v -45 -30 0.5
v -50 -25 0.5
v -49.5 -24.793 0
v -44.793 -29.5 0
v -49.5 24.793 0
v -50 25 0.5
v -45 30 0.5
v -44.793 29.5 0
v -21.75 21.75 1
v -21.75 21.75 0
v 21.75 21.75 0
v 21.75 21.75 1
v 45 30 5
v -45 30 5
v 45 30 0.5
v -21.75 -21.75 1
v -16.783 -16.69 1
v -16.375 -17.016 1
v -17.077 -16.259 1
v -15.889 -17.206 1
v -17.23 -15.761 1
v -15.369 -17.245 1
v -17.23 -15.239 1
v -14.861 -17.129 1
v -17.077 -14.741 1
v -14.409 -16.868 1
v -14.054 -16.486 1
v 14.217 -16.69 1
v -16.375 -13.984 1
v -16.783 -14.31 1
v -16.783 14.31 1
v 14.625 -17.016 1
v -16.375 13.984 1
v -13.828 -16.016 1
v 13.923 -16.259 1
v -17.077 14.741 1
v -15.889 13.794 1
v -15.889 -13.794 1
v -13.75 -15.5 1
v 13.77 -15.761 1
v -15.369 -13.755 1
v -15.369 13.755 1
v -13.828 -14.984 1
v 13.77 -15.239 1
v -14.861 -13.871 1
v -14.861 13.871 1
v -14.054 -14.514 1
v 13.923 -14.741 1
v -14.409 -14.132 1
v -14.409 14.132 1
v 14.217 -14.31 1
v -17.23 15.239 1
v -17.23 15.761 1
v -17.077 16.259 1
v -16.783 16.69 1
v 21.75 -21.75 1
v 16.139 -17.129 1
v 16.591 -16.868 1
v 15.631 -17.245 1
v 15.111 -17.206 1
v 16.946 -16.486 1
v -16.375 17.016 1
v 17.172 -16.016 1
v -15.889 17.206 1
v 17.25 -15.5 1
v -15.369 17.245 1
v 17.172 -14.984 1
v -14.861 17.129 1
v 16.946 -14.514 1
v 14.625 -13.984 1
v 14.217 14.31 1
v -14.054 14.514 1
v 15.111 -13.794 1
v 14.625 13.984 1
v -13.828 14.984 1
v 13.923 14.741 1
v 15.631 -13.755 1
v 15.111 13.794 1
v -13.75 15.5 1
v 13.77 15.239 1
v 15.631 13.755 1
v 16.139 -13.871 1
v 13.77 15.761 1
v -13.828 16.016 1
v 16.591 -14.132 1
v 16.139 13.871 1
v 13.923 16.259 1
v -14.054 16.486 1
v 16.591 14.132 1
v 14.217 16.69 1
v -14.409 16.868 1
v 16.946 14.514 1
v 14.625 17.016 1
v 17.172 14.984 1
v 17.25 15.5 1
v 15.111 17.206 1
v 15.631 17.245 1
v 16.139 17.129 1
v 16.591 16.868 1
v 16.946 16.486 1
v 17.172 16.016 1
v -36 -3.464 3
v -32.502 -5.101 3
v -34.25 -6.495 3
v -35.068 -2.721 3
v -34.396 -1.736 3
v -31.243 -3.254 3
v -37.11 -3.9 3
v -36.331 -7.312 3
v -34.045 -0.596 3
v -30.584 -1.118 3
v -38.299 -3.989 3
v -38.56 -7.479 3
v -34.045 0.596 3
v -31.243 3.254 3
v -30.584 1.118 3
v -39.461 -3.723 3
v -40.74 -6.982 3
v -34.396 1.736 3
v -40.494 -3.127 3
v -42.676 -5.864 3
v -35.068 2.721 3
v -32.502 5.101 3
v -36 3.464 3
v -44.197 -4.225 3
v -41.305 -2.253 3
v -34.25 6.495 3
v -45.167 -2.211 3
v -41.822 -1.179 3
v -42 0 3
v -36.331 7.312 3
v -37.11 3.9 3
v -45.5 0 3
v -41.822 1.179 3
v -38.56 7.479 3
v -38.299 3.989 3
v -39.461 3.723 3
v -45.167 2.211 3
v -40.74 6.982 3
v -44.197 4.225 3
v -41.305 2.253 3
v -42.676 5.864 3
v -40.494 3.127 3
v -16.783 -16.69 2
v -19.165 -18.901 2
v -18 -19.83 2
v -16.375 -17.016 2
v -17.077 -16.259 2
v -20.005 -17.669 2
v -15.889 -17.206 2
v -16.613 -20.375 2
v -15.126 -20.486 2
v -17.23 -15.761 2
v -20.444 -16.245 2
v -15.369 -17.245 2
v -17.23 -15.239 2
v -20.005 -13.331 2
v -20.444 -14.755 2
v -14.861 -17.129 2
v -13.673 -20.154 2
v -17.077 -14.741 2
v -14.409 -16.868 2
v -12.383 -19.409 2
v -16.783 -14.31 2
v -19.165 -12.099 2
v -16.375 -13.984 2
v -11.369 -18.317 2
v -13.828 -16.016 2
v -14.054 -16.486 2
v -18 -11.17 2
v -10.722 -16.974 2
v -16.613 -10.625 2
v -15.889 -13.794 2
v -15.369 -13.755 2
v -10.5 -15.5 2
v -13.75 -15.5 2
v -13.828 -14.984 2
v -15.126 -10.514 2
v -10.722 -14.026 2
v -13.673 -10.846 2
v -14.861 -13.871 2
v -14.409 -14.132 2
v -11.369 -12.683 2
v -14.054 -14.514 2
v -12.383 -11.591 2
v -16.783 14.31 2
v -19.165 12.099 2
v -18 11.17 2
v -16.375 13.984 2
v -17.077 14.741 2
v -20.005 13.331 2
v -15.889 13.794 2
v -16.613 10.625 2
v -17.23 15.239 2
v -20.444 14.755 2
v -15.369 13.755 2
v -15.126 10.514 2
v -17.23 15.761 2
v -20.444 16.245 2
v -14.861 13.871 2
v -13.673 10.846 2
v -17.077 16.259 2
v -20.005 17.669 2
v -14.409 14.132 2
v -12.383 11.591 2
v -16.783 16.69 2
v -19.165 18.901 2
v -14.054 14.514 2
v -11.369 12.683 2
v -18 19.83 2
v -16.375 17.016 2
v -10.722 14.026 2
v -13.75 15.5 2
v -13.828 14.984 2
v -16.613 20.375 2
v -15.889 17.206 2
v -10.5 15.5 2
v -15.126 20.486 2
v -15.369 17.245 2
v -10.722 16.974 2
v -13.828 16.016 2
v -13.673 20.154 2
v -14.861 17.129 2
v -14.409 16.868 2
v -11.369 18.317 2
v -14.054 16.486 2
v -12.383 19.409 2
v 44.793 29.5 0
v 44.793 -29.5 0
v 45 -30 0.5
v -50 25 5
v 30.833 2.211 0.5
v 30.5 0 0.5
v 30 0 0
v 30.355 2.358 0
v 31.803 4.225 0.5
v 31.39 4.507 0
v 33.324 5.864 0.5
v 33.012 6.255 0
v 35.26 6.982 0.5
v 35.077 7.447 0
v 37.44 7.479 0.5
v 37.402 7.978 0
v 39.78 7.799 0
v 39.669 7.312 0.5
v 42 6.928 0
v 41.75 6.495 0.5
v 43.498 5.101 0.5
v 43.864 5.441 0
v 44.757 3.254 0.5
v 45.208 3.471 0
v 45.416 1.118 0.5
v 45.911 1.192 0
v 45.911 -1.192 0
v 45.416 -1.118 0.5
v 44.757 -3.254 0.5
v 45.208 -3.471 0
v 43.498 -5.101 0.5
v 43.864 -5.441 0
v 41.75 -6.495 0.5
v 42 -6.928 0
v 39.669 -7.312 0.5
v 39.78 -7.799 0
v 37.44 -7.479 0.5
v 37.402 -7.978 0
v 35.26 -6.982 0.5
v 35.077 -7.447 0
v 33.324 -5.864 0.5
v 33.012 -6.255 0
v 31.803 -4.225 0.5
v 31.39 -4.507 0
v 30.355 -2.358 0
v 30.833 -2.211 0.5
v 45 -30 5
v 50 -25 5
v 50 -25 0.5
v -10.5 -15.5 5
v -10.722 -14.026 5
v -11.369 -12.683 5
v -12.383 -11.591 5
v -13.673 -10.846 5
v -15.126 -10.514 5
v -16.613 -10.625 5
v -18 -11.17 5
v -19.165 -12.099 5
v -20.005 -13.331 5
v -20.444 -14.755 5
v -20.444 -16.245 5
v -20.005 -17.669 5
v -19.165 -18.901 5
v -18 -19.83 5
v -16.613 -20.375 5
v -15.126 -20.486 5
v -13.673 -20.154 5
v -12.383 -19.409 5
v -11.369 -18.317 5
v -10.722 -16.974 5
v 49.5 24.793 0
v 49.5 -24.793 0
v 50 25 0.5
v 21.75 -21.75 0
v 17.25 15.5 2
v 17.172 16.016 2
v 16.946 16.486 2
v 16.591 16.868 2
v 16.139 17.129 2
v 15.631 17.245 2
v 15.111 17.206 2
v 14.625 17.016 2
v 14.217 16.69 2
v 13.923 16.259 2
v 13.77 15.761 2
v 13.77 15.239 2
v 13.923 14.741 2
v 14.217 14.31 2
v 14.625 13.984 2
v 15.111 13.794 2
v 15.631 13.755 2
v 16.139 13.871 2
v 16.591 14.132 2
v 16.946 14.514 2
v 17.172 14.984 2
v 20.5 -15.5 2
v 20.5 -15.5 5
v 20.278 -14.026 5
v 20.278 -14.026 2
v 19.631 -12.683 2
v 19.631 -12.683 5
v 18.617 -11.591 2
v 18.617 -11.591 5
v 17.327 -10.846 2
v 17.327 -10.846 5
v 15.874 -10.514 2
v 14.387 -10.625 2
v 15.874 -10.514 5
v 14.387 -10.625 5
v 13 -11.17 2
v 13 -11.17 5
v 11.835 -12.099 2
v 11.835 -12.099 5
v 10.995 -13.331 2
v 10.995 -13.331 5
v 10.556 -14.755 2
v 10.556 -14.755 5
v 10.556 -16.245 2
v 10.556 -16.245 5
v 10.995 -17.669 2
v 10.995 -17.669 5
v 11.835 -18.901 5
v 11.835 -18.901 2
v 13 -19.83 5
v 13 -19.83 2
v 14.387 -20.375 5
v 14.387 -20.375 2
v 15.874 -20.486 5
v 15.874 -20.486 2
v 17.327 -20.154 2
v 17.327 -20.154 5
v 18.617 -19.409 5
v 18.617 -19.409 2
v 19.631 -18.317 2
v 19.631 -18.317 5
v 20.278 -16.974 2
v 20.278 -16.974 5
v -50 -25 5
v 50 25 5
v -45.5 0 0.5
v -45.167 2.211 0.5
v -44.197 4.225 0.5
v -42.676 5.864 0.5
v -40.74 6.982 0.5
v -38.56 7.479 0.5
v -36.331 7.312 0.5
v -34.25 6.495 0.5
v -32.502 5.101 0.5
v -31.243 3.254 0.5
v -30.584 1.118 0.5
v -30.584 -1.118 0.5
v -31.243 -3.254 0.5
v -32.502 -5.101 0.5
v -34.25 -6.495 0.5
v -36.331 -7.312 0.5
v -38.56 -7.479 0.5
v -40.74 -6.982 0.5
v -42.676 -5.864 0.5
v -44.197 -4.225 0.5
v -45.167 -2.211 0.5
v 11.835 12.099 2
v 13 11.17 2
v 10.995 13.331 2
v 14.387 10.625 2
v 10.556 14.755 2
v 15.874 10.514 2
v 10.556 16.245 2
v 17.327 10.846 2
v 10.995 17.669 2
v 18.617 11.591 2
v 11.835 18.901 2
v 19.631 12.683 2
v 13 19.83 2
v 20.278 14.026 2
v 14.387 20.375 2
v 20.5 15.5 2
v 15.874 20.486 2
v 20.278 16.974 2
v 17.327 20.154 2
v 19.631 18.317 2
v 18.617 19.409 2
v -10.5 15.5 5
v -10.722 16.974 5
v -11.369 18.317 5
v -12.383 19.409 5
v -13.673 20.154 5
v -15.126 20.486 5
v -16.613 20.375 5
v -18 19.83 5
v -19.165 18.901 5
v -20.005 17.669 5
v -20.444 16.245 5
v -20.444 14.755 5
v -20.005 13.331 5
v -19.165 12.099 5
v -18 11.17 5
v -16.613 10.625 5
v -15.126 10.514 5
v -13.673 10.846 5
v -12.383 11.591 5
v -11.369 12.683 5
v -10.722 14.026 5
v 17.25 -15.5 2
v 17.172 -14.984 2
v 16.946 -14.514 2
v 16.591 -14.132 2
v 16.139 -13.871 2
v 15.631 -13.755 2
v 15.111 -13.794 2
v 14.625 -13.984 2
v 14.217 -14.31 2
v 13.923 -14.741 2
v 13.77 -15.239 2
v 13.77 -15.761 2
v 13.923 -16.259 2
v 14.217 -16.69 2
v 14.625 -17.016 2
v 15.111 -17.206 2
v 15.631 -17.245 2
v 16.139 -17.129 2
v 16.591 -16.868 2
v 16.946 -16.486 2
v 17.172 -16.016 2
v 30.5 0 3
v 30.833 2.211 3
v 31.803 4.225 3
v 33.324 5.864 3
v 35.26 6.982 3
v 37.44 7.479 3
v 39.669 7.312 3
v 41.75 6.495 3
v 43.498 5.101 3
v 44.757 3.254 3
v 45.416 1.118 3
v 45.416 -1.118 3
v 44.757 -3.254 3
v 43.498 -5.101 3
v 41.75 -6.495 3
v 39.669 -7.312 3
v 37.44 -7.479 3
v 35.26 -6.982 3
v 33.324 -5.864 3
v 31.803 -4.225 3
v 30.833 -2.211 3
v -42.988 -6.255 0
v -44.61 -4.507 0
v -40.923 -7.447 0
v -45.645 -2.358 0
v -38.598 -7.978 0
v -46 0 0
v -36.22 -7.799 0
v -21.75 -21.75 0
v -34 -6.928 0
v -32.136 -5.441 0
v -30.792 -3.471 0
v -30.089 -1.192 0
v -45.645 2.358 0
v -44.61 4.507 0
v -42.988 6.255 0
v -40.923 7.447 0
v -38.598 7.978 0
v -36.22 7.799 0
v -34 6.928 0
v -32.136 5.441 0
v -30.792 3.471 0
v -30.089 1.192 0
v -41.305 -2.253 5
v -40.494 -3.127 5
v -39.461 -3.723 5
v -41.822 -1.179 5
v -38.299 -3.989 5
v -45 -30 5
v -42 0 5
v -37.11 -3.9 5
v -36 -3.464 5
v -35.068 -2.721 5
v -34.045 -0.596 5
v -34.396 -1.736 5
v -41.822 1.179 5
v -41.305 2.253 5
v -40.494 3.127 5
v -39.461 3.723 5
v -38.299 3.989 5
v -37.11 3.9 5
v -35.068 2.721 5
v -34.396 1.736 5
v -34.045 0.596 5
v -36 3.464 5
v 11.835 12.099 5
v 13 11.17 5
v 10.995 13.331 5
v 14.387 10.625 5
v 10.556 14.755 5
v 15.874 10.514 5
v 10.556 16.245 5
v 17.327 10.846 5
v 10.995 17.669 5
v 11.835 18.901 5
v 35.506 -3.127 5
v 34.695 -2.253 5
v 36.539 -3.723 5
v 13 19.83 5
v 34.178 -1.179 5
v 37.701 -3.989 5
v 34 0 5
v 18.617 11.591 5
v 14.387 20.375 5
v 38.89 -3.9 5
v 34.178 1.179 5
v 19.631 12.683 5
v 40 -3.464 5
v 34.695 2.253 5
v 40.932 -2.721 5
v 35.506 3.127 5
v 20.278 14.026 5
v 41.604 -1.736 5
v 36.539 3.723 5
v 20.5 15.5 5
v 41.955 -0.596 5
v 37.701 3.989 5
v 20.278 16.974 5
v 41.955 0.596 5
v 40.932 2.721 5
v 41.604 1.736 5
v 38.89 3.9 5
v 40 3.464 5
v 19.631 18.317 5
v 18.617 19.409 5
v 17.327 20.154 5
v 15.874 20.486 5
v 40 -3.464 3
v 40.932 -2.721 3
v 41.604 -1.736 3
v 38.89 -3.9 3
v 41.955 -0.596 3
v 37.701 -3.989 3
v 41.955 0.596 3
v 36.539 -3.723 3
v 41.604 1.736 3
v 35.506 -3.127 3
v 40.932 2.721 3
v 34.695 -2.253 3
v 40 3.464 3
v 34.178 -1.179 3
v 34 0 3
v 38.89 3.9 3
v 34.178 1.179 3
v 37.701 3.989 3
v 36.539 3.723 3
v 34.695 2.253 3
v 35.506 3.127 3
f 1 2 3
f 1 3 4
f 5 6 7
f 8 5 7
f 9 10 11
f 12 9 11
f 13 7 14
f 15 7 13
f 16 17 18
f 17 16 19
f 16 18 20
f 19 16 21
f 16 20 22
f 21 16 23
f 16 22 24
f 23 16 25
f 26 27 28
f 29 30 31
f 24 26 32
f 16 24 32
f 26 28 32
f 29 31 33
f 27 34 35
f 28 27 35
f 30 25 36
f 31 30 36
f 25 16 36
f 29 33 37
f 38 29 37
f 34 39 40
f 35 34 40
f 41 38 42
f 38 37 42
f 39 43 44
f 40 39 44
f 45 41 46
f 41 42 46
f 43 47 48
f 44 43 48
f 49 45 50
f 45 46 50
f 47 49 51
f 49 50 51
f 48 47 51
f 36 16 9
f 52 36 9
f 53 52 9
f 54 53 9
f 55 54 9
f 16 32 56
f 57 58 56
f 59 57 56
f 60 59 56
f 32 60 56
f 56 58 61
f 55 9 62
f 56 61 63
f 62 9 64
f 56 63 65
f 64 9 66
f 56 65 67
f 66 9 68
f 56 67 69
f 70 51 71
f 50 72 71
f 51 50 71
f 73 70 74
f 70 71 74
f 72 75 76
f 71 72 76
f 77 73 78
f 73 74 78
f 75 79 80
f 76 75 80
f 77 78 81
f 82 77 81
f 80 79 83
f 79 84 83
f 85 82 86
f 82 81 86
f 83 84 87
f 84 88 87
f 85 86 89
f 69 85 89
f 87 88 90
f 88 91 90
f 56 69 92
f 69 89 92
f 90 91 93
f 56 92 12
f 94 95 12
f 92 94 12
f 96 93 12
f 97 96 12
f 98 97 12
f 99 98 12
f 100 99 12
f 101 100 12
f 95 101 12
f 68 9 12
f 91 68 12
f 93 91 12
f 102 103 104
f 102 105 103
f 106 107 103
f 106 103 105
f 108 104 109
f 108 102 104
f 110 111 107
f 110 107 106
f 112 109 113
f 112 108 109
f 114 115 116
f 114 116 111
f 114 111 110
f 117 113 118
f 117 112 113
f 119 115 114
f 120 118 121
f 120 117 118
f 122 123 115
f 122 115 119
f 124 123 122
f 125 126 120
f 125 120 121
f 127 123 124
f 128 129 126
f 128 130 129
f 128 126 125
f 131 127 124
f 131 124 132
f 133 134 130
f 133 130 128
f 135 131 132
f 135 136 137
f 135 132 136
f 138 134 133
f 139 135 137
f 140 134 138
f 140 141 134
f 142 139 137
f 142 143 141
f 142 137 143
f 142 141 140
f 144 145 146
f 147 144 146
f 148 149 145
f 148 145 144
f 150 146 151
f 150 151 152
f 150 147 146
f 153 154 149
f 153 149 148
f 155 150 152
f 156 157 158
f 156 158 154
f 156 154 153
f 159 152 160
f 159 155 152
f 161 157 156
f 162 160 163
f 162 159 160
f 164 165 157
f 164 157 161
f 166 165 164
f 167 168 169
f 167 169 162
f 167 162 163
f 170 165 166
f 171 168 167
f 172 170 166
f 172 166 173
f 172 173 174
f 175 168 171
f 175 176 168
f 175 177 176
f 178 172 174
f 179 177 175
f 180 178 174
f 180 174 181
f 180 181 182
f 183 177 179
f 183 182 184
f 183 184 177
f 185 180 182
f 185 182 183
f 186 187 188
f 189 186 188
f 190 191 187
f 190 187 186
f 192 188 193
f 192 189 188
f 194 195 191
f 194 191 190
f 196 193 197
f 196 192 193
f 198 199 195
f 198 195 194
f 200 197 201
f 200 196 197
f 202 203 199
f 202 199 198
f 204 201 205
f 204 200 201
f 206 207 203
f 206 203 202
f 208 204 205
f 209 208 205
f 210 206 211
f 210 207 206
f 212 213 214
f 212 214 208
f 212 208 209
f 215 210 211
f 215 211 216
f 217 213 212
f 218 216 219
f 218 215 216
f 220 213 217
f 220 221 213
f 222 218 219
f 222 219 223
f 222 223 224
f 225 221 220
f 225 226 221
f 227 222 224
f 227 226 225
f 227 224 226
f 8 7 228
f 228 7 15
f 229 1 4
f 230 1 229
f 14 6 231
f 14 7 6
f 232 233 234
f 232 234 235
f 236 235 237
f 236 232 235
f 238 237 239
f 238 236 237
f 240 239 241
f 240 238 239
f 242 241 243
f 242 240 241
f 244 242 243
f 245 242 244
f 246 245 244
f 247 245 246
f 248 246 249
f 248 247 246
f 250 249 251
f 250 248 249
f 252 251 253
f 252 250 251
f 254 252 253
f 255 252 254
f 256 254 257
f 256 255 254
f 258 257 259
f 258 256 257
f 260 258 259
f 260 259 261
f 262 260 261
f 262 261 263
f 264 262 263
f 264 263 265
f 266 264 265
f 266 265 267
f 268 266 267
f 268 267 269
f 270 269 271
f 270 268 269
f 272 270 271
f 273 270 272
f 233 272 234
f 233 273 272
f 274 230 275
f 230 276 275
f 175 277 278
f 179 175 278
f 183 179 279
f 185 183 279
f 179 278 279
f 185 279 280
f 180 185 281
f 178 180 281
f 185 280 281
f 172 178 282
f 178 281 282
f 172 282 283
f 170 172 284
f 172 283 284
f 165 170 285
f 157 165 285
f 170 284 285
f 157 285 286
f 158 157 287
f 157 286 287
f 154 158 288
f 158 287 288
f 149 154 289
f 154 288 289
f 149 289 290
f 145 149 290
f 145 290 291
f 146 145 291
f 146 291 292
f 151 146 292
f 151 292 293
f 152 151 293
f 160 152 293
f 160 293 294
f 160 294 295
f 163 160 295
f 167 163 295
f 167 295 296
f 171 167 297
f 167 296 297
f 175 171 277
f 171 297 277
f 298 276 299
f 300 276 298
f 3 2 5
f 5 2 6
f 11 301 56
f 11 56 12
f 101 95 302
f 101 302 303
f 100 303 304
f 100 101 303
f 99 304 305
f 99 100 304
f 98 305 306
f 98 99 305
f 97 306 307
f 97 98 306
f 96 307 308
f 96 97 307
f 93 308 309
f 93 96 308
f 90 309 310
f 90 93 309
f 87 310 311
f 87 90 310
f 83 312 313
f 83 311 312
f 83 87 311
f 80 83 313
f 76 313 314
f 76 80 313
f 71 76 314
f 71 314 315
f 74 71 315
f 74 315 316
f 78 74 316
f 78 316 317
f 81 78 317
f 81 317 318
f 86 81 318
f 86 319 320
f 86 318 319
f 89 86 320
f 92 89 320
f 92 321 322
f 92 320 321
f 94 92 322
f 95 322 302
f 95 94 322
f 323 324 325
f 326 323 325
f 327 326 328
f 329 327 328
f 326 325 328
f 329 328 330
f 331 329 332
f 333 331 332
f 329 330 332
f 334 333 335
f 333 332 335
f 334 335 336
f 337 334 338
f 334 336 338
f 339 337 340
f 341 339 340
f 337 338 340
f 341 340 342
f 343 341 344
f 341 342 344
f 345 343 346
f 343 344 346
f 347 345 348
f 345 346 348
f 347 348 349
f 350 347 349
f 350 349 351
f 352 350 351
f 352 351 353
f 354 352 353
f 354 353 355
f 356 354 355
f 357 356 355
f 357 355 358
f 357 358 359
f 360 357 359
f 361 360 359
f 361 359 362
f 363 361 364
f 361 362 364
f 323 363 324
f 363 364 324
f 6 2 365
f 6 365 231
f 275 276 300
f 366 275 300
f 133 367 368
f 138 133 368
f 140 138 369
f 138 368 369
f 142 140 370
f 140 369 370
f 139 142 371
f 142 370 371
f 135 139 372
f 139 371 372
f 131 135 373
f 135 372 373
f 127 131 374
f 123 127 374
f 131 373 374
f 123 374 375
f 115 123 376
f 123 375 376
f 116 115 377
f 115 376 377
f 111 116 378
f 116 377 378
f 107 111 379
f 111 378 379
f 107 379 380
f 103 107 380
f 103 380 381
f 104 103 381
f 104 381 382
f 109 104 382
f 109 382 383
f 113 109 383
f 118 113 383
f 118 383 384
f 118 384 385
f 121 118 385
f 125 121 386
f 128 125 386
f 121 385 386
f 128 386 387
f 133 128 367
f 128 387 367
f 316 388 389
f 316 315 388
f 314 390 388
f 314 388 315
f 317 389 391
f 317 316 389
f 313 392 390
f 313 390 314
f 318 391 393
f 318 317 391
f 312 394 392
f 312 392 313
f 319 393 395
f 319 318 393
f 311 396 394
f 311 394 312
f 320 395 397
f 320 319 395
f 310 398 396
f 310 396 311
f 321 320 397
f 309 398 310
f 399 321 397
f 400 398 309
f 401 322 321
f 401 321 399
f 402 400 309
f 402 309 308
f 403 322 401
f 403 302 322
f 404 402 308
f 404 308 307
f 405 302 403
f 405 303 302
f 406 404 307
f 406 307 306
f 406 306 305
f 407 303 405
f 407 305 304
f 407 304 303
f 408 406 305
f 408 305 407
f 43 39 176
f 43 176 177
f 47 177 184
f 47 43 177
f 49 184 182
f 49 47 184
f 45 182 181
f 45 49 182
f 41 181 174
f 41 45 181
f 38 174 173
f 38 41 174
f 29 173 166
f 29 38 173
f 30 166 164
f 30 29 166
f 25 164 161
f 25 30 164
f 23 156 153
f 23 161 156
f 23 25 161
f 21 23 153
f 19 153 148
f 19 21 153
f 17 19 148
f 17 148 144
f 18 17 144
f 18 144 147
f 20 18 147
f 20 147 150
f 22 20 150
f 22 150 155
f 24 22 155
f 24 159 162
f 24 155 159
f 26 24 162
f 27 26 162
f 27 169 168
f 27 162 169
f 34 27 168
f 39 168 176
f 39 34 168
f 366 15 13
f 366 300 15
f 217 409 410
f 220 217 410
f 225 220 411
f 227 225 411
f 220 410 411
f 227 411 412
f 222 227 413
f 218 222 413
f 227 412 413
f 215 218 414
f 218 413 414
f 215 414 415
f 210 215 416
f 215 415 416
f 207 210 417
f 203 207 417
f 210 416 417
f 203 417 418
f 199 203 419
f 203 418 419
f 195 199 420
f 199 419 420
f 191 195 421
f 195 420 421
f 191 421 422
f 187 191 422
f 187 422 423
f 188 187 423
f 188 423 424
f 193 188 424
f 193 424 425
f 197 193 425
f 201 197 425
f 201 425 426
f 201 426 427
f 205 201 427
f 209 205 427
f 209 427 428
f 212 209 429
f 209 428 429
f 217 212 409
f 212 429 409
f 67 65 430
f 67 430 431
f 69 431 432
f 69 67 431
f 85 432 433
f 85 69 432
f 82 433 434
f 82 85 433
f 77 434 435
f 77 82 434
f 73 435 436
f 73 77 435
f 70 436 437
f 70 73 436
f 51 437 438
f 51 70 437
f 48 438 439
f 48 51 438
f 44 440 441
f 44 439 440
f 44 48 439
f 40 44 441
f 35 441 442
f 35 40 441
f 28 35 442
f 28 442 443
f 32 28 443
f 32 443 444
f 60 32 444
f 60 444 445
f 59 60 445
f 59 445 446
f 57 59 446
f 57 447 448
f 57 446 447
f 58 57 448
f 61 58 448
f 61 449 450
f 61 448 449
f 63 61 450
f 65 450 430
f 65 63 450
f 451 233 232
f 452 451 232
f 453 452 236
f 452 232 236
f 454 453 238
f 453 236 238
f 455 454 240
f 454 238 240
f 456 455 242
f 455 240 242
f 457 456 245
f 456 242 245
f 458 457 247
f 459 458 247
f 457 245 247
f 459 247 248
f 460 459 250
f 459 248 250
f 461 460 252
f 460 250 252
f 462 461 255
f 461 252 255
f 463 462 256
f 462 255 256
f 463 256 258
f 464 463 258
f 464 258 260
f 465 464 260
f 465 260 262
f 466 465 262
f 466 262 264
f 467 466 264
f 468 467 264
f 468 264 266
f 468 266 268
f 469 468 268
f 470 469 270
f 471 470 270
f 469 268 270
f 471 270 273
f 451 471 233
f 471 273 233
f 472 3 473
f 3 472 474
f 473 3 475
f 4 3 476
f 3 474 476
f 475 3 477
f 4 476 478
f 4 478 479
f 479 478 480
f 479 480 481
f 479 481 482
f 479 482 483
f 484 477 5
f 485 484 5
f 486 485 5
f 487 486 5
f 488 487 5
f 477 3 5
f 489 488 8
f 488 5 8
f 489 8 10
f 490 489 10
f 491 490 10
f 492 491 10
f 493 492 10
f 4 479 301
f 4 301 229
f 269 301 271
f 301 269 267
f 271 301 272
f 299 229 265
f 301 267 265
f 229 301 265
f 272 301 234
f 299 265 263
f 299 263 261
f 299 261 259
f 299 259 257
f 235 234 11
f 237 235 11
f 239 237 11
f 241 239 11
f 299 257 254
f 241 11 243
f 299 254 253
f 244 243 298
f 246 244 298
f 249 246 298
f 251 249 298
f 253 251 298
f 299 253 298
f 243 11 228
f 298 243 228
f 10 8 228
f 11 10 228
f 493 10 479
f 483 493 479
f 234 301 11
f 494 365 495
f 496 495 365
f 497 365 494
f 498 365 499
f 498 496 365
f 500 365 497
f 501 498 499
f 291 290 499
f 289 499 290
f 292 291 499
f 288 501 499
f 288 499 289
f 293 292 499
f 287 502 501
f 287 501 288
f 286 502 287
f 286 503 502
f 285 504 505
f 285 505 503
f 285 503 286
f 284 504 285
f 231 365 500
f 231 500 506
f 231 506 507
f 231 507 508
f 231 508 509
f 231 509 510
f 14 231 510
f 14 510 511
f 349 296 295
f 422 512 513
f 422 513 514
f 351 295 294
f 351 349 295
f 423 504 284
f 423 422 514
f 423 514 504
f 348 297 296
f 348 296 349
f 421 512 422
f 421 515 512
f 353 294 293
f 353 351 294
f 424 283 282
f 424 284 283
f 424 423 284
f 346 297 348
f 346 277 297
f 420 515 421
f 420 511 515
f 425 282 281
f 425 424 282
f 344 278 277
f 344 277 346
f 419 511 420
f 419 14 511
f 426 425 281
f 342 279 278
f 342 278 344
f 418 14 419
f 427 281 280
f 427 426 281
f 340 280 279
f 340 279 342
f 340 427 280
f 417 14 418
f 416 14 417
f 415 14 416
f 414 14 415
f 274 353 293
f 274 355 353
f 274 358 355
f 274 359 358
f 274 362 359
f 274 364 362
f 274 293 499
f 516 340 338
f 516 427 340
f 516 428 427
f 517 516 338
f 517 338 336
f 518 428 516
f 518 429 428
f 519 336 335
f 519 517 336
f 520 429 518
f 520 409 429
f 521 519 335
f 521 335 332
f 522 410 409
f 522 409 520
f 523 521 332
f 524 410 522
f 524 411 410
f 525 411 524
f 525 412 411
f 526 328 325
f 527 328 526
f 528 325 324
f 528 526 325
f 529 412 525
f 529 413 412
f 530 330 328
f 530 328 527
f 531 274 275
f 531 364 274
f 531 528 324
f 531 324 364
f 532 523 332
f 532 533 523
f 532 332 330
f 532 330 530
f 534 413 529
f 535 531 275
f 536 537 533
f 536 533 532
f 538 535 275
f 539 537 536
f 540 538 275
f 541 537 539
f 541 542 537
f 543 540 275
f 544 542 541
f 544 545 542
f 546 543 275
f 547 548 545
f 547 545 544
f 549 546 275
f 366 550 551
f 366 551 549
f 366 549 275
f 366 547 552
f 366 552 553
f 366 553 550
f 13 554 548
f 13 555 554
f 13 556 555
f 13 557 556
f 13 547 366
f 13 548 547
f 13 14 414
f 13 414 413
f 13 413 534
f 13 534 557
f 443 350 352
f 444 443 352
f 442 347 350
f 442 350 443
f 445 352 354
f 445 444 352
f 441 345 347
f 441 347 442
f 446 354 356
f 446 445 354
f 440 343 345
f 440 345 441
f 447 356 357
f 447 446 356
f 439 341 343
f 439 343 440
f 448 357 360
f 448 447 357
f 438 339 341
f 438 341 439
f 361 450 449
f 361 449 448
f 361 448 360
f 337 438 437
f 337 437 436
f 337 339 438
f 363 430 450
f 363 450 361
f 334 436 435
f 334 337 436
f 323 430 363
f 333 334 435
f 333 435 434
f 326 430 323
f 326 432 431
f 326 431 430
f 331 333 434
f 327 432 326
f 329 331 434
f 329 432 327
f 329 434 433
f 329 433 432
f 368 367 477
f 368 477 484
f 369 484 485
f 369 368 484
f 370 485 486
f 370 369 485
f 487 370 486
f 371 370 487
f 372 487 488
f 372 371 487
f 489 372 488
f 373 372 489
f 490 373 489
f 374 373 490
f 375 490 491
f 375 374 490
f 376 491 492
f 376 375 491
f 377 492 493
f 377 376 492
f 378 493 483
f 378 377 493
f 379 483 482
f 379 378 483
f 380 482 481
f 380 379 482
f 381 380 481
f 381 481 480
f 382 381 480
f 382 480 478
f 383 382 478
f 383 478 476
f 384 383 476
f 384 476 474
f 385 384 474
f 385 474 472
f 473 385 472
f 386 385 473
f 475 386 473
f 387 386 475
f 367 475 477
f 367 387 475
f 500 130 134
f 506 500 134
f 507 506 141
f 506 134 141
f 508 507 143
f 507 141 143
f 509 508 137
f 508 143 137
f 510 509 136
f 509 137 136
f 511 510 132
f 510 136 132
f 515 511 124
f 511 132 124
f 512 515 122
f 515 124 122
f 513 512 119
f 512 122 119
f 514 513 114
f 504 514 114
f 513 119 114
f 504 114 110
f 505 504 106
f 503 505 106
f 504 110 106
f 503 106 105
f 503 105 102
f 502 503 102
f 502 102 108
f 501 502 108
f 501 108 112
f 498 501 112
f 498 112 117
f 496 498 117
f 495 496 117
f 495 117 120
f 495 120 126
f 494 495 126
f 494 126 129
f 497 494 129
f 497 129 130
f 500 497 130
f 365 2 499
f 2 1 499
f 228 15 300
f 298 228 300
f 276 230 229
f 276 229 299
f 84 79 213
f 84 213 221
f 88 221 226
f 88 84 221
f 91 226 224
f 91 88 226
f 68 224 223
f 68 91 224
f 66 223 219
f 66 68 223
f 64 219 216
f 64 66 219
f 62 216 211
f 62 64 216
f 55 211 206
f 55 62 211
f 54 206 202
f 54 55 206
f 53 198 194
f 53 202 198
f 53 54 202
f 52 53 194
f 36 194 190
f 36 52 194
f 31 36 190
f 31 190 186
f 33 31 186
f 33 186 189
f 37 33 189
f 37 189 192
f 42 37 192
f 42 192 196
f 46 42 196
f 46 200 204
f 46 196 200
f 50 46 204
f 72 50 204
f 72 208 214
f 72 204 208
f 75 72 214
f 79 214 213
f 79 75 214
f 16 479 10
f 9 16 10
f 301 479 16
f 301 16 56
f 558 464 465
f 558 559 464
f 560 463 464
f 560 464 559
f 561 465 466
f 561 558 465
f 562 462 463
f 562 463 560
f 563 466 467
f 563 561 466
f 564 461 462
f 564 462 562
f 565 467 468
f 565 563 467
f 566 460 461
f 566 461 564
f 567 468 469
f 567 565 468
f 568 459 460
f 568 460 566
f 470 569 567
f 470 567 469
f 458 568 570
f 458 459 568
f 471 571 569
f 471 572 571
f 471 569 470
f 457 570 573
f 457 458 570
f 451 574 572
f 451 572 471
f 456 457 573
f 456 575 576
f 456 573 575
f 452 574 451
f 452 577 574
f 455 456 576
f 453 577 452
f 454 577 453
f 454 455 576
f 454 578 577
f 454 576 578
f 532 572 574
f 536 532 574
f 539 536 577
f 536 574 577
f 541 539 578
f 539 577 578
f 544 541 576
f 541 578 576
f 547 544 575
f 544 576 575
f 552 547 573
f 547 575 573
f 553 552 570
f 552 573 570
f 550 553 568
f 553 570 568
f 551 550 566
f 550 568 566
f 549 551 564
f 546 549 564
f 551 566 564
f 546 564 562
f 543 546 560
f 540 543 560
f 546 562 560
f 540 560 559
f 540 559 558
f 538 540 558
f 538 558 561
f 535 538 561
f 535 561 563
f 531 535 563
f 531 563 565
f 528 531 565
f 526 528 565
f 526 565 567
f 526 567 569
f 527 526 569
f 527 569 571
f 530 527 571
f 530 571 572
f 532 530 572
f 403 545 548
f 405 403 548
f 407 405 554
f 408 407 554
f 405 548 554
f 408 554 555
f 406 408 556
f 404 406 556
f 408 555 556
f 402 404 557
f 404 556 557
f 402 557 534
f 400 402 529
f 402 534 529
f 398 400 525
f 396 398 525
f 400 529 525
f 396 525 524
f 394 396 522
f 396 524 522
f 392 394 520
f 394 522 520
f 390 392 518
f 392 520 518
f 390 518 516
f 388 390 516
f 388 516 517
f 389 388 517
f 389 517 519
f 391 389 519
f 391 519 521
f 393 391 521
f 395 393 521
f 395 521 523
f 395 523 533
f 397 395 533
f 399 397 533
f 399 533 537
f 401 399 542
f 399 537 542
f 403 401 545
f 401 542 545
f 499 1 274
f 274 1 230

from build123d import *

# Parameters (mm, degrees)
SKETCH1_W               = 100
SKETCH1_H               = 60
BOSS_EXTRUDE1_DEPTH     = 5
SKETCH3_W               = 43.5
SKETCH3_H               = 43.5
CUT_EXTRUDE1_DEPTH      = 1
SKETCH4_R               = 1.75
CUT_EXTRUDE3_DEPTH      = 92
CUT_EXTRUDE3_DEPTH_BACK = 1
SKETCH5_R               = 5
CUT_EXTRUDE4_DEPTH      = 3
SKETCH6_R               = 4
CUT_EXTRUDE5_DEPTH      = 1
CUT_EXTRUDE5_DEPTH_BACK = 6
SKETCH7_R               = 7.5
CUT_EXTRUDE6_DEPTH      = 3
CHAMFER1_SIZE           = 0.5
CHAMFER2_SIZE           = 5
CHAMFER3_SIZE           = 0.5


with BuildPart() as part:
    # Sketch1 → Boss-Extrude1 (new body)
    with BuildSketch(Plane.XY):
        Rectangle(SKETCH1_W, SKETCH1_H)
    extrude(amount=BOSS_EXTRUDE1_DEPTH)

    # Sketch3 → Cut-Extrude1 (cut)
    with BuildSketch(Plane.XY):
        Rectangle(SKETCH3_W, SKETCH3_H)
    extrude(amount=CUT_EXTRUDE1_DEPTH, mode=Mode.SUBTRACT)

    # Sketch4 → Cut-Extrude3 (cut, two sides)
    with BuildSketch(Plane.XY.offset(-48)) as cut_extrude3_sk:
        with Locations((-15.5, 15.5)):
            Circle(SKETCH4_R)
        with Locations((15.5, 15.5)):
            Circle(SKETCH4_R)
        with Locations((15.499999999, -15.5)):
            Circle(SKETCH4_R)
        with Locations((-15.5, -15.5)):
            Circle(SKETCH4_R)
    extrude(amount=CUT_EXTRUDE3_DEPTH, mode=Mode.SUBTRACT)
    extrude(cut_extrude3_sk.sketch, amount=-CUT_EXTRUDE3_DEPTH_BACK, mode=Mode.SUBTRACT)

    # Sketch5 → Cut-Extrude4 (cut)
    with BuildSketch(Plane.XY.offset(5)):
        with Locations((-15.5, 15.5)):
            Circle(SKETCH5_R)
        with Locations((15.5, 15.5)):
            Circle(SKETCH5_R)
        with Locations((15.499999999, -15.5)):
            Circle(SKETCH5_R)
        with Locations((-15.5, -15.5)):
            Circle(SKETCH5_R)
    extrude(amount=-CUT_EXTRUDE4_DEPTH, mode=Mode.SUBTRACT)

    # Sketch6 → Cut-Extrude5 (cut, two sides)
    with BuildSketch(Plane(origin=(0, 0, 0), x_dir=(-1, 0, 0), z_dir=(0, 0, -1))) as cut_extrude5_sk:
        with Locations((-38, 0)):
            Circle(SKETCH6_R)
        with Locations((38, 0)):
            Circle(SKETCH6_R)
    extrude(amount=CUT_EXTRUDE5_DEPTH, mode=Mode.SUBTRACT)
    extrude(cut_extrude5_sk.sketch, amount=-CUT_EXTRUDE5_DEPTH_BACK, mode=Mode.SUBTRACT)

    # Sketch7 → Cut-Extrude6 (cut)
    with BuildSketch(Plane(origin=(0, 0, 0), x_dir=(-1, 0, 0), z_dir=(0, 0, -1))):
        with Locations((-38, 0)):
            Circle(SKETCH7_R)
        with Locations((38, 0)):
            Circle(SKETCH7_R)
    extrude(amount=-CUT_EXTRUDE6_DEPTH, mode=Mode.SUBTRACT)

    # Chamfer1
    chamfer1_edges = [part.edges().sort_by_distance(p)[0] for p in [
        (45.5, 0, 0),
        (-30.5, 0, 0),
    ]]
    chamfer(chamfer1_edges, length=CHAMFER1_SIZE)

    # Chamfer2
    chamfer2_edges = [part.edges().sort_by_distance(p)[0] for p in [
        (50, -30, 2.5),
        (-50, -30, 2.5),
        (-50, 30, 2.5),
        (50, 30, 2.5),
    ]]
    chamfer(chamfer2_edges, length=CHAMFER2_SIZE)

    # Chamfer3
    chamfer3_edges = [part.edges().sort_by_distance(p)[0] for p in [
        (0, 30, 0),
        (50, 0, 0),
        (0, -30, 0),
        (-50, 0, 0),
        (47.5, -27.5, 0),
        (-47.5, -27.5, 0),
        (-47.5, 27.5, 0),
        (47.5, 27.5, 0),
    ]]
    chamfer(chamfer3_edges, length=CHAMFER3_SIZE)


solid = part.part
